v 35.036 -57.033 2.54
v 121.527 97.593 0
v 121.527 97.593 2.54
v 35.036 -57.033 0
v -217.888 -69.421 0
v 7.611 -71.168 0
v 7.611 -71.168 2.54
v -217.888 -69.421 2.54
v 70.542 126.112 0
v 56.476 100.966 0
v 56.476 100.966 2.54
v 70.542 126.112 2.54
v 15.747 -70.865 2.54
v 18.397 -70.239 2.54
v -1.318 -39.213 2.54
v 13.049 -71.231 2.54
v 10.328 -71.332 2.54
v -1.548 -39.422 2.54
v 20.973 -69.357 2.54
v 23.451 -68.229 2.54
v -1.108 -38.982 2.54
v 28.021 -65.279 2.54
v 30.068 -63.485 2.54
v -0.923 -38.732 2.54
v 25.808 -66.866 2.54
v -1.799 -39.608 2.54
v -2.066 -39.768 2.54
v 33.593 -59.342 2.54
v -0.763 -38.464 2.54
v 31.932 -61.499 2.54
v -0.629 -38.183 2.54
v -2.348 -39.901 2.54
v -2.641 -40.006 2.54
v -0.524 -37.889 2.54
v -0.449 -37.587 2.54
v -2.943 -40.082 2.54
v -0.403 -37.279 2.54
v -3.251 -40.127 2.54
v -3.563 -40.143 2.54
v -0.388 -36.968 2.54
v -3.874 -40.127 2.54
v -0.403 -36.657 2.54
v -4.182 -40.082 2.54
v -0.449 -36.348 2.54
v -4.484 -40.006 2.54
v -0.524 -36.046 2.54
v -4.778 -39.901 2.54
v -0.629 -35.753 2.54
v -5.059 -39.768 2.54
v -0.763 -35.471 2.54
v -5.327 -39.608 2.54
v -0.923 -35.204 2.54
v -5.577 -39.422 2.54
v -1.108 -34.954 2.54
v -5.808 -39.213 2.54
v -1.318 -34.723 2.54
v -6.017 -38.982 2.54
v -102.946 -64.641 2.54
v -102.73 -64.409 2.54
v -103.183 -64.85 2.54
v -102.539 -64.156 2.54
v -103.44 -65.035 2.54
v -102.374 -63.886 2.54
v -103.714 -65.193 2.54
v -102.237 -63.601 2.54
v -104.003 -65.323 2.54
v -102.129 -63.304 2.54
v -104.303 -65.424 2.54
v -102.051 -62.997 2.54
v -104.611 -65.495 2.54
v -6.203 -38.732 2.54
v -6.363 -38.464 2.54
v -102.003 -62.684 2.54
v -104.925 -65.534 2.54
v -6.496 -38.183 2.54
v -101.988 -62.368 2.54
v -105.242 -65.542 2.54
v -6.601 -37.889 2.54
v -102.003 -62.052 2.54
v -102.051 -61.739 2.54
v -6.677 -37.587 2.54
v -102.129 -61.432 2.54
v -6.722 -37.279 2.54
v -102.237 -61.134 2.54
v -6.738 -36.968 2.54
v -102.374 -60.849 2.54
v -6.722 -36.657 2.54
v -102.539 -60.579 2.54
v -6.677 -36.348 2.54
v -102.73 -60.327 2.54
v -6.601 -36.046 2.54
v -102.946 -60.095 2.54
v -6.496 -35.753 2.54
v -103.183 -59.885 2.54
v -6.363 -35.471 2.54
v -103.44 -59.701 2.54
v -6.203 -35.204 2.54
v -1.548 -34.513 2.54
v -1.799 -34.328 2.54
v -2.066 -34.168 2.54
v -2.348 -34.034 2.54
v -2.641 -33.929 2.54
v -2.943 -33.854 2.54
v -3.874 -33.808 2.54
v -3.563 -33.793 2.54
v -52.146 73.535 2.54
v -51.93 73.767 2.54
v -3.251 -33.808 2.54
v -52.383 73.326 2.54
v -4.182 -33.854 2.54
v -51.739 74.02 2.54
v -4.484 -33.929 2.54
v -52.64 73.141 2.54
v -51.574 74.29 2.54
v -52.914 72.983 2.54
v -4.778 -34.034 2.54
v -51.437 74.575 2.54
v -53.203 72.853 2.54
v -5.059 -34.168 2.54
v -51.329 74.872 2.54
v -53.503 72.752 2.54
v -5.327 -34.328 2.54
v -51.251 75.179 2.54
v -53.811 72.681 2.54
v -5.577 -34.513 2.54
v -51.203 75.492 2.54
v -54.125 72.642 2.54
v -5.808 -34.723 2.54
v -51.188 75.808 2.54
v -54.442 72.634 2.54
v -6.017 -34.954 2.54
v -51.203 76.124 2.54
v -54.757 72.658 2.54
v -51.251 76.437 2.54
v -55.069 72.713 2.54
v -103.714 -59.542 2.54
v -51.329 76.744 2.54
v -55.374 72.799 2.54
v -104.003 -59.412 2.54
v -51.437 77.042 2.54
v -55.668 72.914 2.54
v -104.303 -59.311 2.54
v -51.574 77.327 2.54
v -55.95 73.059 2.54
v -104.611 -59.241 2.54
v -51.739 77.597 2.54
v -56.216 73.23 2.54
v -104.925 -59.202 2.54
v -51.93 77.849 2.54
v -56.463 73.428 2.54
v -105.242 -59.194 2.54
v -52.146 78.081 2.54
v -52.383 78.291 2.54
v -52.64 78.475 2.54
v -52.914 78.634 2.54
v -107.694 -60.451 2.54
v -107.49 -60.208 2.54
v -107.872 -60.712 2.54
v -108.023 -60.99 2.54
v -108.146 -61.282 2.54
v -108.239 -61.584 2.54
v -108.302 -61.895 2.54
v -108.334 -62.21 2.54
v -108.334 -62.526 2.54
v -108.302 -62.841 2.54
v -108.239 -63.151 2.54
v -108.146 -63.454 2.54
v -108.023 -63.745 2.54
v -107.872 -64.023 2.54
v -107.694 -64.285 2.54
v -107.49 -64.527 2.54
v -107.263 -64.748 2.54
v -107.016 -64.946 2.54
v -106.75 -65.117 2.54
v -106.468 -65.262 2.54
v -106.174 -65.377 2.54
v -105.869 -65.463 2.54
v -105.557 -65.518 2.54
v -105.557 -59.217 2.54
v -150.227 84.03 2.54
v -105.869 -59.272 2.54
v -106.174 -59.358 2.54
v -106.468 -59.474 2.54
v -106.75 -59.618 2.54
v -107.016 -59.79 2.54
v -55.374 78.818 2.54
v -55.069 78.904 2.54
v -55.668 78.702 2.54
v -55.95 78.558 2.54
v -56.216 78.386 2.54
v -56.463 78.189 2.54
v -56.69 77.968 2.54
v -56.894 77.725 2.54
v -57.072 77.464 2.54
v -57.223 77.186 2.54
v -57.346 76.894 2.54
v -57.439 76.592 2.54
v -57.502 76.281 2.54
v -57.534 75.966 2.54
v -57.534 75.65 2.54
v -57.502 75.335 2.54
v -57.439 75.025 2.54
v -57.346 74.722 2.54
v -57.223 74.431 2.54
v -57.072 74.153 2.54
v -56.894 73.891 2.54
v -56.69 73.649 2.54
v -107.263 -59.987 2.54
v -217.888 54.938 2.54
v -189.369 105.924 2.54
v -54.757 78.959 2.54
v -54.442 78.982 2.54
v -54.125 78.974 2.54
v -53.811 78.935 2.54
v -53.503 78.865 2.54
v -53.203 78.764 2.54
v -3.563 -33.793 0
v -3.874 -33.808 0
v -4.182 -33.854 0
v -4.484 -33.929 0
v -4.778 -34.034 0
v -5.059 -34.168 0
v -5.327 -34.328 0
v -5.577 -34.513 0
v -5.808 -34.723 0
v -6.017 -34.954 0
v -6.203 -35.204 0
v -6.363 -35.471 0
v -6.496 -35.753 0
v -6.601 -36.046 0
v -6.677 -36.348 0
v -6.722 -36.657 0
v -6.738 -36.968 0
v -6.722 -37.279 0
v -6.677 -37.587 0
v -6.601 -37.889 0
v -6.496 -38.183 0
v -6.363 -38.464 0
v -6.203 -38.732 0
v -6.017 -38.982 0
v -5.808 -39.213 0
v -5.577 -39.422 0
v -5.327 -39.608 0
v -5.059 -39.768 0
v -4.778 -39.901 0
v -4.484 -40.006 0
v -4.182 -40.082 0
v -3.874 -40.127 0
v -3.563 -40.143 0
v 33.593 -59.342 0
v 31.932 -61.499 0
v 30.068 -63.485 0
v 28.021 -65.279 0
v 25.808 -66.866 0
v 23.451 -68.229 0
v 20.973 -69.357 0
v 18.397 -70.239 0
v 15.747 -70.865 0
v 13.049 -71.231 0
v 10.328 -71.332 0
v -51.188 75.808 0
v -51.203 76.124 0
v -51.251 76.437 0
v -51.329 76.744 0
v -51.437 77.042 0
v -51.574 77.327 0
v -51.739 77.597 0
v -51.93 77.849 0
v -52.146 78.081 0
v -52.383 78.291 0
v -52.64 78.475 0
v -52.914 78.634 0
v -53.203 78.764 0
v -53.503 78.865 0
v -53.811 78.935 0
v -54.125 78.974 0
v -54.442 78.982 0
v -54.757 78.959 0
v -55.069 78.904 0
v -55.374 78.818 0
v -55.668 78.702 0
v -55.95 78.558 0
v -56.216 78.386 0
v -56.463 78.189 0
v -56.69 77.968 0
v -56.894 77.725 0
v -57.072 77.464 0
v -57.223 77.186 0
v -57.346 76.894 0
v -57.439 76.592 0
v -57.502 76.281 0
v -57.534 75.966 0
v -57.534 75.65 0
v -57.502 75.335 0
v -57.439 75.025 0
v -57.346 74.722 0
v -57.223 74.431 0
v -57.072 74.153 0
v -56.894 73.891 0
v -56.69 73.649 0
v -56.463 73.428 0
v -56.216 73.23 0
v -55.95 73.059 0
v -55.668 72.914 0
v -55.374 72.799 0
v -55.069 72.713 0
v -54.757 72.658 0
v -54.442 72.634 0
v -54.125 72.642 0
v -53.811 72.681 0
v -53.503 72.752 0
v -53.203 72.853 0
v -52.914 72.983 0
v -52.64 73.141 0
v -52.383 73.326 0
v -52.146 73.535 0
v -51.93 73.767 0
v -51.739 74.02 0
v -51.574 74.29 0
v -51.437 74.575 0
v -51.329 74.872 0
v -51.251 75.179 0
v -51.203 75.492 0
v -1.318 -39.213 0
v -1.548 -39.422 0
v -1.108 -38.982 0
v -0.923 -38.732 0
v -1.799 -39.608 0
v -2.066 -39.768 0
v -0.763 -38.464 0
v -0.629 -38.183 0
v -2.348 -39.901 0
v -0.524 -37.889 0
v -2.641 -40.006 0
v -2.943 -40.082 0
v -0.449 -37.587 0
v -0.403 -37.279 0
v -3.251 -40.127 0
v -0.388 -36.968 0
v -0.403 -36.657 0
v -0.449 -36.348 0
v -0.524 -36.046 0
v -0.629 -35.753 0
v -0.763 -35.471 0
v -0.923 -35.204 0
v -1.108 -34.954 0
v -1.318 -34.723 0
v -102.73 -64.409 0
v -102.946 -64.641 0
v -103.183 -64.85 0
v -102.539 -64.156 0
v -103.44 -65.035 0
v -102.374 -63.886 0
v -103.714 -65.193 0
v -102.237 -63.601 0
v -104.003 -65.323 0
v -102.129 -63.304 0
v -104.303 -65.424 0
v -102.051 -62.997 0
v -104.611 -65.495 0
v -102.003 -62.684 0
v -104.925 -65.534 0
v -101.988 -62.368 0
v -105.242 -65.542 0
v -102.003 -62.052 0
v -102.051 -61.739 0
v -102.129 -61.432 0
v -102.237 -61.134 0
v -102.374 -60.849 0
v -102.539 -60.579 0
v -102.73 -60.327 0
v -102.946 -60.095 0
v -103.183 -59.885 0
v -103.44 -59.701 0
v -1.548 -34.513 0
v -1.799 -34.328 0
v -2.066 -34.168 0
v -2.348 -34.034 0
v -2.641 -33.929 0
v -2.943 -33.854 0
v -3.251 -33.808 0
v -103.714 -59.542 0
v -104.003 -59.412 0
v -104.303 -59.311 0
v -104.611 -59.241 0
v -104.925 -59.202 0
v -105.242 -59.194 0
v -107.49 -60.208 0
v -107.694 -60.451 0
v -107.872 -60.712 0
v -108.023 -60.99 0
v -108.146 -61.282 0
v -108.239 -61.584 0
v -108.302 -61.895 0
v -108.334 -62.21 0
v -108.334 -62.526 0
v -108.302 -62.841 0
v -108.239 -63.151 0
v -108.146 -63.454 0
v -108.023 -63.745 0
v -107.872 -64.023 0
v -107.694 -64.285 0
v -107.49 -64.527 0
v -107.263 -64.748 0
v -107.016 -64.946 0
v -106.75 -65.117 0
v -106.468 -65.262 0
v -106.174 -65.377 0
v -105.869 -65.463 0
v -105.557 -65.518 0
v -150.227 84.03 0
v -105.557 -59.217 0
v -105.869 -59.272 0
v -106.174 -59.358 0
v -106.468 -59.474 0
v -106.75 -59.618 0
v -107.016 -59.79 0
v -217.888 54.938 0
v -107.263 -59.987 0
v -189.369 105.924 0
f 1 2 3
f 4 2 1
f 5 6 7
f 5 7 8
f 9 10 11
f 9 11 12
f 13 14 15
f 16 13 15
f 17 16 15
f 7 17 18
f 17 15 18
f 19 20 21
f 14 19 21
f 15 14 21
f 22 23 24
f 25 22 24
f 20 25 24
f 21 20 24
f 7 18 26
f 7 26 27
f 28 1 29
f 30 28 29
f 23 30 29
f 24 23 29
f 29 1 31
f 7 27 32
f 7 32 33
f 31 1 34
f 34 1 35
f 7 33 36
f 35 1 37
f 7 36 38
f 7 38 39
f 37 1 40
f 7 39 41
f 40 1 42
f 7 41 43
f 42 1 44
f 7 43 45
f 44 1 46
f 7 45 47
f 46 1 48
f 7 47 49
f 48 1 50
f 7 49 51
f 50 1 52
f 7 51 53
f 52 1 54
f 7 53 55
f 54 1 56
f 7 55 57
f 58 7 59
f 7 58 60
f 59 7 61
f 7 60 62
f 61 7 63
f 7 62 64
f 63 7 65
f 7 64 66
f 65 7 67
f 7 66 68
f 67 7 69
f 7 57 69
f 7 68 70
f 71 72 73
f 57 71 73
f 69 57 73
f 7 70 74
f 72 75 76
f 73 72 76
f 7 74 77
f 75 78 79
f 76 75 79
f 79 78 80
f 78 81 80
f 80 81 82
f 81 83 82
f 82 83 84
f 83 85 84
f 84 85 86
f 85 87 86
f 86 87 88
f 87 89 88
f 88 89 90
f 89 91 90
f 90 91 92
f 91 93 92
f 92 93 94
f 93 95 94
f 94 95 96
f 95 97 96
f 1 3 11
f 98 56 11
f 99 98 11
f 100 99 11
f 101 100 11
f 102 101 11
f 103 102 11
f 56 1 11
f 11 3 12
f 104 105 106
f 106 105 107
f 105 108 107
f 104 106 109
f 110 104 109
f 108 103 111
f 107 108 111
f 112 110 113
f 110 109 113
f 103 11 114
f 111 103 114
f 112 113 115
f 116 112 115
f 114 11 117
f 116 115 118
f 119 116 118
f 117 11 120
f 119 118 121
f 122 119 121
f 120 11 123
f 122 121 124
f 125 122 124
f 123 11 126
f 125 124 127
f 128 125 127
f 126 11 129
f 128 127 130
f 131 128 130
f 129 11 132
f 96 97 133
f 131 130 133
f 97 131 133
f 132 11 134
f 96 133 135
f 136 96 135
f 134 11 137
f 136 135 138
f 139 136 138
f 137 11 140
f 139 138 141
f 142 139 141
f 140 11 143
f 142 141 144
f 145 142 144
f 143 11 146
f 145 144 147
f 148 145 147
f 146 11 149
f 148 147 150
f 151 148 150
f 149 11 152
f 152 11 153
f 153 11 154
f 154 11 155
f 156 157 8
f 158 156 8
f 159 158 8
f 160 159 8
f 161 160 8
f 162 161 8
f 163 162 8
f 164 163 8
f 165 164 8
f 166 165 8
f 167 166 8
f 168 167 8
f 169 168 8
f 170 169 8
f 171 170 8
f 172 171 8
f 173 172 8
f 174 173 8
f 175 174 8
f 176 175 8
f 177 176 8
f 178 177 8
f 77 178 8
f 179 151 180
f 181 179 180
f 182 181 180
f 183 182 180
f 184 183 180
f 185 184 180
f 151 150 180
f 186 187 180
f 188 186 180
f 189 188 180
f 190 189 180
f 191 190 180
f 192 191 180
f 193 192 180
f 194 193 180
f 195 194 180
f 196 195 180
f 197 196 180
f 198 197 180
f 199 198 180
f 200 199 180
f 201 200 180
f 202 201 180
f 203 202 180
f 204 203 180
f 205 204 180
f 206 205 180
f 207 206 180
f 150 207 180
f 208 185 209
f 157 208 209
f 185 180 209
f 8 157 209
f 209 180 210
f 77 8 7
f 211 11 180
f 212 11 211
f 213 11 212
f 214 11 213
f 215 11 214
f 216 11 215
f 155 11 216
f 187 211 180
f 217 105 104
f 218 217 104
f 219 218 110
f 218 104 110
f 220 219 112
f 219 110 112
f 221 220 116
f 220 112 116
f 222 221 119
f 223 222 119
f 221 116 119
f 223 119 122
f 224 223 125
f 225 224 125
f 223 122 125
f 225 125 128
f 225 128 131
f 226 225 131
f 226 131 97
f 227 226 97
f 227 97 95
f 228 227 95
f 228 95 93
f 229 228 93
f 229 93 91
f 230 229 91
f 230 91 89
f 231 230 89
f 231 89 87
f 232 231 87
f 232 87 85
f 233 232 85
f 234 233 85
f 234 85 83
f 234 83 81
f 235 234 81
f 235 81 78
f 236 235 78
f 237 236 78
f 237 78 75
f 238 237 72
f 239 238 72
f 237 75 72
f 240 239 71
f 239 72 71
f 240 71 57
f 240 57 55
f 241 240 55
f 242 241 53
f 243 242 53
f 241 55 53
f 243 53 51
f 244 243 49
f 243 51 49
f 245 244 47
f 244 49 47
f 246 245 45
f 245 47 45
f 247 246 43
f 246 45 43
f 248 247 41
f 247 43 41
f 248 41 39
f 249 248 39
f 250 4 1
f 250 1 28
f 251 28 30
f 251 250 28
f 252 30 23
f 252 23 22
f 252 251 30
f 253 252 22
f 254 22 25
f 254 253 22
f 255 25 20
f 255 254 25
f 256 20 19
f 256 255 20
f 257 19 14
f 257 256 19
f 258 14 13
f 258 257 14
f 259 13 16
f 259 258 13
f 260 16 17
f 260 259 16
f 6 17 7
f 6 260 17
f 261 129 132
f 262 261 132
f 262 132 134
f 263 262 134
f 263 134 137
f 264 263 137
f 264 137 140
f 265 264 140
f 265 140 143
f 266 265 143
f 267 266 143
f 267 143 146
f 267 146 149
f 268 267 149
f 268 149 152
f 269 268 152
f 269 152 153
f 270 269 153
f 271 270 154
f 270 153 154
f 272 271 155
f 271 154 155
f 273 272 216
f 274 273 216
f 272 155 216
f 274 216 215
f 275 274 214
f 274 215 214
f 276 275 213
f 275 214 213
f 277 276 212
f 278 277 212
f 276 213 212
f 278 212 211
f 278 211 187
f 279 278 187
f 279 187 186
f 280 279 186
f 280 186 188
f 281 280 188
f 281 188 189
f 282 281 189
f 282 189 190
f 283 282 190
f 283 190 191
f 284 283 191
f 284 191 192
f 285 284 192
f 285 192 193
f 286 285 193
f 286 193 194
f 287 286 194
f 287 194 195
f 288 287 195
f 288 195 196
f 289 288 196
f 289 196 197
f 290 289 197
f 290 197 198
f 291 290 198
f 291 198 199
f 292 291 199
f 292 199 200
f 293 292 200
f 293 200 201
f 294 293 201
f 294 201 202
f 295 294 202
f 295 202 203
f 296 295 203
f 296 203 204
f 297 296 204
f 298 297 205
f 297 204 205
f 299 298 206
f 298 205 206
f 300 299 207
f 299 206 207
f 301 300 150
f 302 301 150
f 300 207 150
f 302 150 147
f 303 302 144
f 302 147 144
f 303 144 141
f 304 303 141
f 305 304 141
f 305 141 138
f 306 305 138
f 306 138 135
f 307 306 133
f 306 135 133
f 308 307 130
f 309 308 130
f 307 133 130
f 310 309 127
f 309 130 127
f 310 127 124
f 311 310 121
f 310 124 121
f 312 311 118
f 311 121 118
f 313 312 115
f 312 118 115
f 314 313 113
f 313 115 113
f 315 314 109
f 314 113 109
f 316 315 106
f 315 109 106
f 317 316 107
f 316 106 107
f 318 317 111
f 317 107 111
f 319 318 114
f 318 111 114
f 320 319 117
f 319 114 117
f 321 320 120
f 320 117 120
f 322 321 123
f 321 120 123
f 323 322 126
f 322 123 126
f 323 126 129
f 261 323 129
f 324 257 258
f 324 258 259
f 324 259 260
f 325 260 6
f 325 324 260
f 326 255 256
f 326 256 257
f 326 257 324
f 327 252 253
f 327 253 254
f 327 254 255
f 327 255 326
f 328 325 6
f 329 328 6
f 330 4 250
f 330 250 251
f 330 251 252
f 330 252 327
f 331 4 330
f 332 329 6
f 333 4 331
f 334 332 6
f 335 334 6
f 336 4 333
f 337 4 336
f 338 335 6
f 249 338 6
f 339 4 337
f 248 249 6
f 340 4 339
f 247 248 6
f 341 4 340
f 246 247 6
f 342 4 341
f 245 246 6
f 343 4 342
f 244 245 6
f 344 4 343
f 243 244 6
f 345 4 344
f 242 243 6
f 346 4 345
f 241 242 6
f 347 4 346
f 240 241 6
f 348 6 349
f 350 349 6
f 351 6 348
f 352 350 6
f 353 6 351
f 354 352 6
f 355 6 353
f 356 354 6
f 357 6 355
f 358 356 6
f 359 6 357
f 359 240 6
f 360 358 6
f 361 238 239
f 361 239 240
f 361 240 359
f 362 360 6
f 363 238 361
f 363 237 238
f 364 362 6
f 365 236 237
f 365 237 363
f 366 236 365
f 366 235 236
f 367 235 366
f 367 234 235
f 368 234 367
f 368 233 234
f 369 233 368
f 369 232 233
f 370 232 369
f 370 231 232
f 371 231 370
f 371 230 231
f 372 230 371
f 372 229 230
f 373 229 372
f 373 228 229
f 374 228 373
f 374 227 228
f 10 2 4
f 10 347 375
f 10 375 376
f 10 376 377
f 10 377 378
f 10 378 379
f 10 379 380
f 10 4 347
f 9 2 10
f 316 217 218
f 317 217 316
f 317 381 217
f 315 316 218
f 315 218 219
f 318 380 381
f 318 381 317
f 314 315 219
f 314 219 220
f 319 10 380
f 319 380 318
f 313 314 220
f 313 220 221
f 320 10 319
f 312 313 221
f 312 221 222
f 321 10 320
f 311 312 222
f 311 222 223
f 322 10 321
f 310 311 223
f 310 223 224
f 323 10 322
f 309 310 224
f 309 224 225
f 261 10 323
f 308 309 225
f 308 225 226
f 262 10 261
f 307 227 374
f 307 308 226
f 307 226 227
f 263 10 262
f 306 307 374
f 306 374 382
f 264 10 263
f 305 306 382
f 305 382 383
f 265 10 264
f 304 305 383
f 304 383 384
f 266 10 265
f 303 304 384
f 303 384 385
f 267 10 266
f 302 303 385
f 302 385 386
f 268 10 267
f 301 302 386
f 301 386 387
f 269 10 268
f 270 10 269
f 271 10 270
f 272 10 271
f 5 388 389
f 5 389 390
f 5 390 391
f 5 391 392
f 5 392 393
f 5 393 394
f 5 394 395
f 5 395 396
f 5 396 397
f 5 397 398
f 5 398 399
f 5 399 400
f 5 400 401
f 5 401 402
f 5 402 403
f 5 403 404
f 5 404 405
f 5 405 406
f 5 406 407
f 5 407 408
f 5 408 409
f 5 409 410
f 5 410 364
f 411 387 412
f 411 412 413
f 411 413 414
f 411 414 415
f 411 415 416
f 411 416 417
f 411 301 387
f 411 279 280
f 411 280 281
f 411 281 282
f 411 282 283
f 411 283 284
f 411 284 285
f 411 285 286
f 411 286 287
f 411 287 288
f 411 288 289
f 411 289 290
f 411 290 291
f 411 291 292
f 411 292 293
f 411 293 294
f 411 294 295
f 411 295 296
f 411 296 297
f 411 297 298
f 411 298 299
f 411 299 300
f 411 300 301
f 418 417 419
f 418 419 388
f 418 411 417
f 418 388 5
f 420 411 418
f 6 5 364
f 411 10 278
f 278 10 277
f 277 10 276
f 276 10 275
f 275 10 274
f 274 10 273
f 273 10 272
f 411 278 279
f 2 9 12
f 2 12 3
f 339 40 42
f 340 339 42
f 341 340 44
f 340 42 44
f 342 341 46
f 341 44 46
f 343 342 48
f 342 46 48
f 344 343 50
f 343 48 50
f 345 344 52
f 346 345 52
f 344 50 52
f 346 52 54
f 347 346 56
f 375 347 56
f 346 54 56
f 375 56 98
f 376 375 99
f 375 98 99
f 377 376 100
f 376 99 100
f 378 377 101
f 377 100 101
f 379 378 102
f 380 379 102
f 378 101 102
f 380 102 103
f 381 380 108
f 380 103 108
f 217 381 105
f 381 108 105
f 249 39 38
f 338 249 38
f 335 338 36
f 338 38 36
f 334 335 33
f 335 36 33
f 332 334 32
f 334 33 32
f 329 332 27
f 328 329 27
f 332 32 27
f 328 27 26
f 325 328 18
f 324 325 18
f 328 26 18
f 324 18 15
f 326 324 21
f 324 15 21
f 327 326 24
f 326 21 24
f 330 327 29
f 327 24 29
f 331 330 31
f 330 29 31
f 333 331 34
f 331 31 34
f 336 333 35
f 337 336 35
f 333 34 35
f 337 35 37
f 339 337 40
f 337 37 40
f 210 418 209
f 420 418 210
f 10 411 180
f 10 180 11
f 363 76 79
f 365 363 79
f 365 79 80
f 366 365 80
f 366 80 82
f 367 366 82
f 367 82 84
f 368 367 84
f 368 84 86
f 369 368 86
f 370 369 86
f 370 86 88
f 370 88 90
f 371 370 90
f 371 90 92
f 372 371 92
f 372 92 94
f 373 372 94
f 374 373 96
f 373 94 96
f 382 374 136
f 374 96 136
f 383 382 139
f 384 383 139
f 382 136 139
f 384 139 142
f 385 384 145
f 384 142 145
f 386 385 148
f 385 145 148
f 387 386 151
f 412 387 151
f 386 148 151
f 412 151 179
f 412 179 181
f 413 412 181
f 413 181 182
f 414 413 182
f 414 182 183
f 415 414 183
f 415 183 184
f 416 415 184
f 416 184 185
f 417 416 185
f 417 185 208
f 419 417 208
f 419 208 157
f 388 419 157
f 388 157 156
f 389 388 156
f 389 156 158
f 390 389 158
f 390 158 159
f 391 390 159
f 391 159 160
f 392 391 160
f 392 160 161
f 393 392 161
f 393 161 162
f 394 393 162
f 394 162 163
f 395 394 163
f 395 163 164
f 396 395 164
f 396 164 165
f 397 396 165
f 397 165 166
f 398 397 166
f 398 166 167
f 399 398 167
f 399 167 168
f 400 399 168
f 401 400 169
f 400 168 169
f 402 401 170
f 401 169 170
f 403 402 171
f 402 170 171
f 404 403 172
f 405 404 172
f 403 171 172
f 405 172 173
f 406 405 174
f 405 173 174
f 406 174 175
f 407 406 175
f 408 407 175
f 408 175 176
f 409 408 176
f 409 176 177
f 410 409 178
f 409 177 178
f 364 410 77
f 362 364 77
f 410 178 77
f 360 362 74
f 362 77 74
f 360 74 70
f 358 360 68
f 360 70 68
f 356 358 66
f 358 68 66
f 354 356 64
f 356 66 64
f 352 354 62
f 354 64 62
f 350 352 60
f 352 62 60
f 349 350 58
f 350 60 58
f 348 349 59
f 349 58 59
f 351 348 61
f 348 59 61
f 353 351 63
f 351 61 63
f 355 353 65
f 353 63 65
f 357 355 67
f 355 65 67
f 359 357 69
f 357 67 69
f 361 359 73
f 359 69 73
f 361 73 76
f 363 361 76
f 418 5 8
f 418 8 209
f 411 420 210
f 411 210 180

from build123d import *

# Parameters (mm, degrees)
BOSS_EXTRUDE1_DEPTH = 2.54
SKETCH2_R           = 3.175
CUT_EXTRUDE1_DEPTH  = 252.765490419


with BuildPart() as part:
    # Sketch1 → Boss-Extrude1 (new body)
    with BuildSketch(Plane.XY):
        with BuildLine():
            Line((56.475591943, 100.965617501), (70.541585889, 126.112441388))
            Line((70.541585889, 126.112441388), (121.527407416, 97.59328286))
            Line((121.527407416, 97.59328286), (35.036266464, -57.033364763))
            ThreePointArc((35.036266464, -57.033364763), (23.451402169, -68.229473927), (7.610684951, -71.167776012))
            Line((7.610684951, -71.167776012), (-217.887729561, -69.42085916))
            Line((-217.887729561, -69.42085916), (-217.887729561, 54.938377315))
            Line((-217.887729561, 54.938377315), (-189.368571032, 105.924198843))
            Line((-189.368571032, 105.924198843), (-150.227007979, 84.030181873))
            Line((-150.227007979, 84.030181873), (56.475591943, 100.965617501))
        make_face()
    extrude(amount=BOSS_EXTRUDE1_DEPTH)

    # Sketch2 → Cut-Extrude1 (cut, through all)
    with BuildSketch(Plane.XY.offset(2.54)):
        with BuildLine():
            ThreePointArc((-0.387630151, -36.96777295), (-1.317566121, -34.72270892), (-3.562630151, -33.79277295))
            Line((-3.562630151, -33.79277295), (-3.562630151, -40.14277295))
            ThreePointArc((-3.562630151, -40.14277295), (-1.317566121, -39.212836981), (-0.387630151, -36.96777295))
        make_face()
        with BuildLine():
            Line((-3.562630151, -40.14277295), (-3.562630151, -33.79277295))
            ThreePointArc((-3.562630151, -33.79277295), (-6.737630151, -36.96777295), (-3.562630151, -40.14277295))
        make_face()
        with Locations((-54.362630151, 75.80822705)):
            Circle(SKETCH2_R)
        with Locations((-105.162630151, -62.36777295)):
            Circle(SKETCH2_R)
    extrude(amount=-CUT_EXTRUDE1_DEPTH, mode=Mode.SUBTRACT)


solid = part.part
